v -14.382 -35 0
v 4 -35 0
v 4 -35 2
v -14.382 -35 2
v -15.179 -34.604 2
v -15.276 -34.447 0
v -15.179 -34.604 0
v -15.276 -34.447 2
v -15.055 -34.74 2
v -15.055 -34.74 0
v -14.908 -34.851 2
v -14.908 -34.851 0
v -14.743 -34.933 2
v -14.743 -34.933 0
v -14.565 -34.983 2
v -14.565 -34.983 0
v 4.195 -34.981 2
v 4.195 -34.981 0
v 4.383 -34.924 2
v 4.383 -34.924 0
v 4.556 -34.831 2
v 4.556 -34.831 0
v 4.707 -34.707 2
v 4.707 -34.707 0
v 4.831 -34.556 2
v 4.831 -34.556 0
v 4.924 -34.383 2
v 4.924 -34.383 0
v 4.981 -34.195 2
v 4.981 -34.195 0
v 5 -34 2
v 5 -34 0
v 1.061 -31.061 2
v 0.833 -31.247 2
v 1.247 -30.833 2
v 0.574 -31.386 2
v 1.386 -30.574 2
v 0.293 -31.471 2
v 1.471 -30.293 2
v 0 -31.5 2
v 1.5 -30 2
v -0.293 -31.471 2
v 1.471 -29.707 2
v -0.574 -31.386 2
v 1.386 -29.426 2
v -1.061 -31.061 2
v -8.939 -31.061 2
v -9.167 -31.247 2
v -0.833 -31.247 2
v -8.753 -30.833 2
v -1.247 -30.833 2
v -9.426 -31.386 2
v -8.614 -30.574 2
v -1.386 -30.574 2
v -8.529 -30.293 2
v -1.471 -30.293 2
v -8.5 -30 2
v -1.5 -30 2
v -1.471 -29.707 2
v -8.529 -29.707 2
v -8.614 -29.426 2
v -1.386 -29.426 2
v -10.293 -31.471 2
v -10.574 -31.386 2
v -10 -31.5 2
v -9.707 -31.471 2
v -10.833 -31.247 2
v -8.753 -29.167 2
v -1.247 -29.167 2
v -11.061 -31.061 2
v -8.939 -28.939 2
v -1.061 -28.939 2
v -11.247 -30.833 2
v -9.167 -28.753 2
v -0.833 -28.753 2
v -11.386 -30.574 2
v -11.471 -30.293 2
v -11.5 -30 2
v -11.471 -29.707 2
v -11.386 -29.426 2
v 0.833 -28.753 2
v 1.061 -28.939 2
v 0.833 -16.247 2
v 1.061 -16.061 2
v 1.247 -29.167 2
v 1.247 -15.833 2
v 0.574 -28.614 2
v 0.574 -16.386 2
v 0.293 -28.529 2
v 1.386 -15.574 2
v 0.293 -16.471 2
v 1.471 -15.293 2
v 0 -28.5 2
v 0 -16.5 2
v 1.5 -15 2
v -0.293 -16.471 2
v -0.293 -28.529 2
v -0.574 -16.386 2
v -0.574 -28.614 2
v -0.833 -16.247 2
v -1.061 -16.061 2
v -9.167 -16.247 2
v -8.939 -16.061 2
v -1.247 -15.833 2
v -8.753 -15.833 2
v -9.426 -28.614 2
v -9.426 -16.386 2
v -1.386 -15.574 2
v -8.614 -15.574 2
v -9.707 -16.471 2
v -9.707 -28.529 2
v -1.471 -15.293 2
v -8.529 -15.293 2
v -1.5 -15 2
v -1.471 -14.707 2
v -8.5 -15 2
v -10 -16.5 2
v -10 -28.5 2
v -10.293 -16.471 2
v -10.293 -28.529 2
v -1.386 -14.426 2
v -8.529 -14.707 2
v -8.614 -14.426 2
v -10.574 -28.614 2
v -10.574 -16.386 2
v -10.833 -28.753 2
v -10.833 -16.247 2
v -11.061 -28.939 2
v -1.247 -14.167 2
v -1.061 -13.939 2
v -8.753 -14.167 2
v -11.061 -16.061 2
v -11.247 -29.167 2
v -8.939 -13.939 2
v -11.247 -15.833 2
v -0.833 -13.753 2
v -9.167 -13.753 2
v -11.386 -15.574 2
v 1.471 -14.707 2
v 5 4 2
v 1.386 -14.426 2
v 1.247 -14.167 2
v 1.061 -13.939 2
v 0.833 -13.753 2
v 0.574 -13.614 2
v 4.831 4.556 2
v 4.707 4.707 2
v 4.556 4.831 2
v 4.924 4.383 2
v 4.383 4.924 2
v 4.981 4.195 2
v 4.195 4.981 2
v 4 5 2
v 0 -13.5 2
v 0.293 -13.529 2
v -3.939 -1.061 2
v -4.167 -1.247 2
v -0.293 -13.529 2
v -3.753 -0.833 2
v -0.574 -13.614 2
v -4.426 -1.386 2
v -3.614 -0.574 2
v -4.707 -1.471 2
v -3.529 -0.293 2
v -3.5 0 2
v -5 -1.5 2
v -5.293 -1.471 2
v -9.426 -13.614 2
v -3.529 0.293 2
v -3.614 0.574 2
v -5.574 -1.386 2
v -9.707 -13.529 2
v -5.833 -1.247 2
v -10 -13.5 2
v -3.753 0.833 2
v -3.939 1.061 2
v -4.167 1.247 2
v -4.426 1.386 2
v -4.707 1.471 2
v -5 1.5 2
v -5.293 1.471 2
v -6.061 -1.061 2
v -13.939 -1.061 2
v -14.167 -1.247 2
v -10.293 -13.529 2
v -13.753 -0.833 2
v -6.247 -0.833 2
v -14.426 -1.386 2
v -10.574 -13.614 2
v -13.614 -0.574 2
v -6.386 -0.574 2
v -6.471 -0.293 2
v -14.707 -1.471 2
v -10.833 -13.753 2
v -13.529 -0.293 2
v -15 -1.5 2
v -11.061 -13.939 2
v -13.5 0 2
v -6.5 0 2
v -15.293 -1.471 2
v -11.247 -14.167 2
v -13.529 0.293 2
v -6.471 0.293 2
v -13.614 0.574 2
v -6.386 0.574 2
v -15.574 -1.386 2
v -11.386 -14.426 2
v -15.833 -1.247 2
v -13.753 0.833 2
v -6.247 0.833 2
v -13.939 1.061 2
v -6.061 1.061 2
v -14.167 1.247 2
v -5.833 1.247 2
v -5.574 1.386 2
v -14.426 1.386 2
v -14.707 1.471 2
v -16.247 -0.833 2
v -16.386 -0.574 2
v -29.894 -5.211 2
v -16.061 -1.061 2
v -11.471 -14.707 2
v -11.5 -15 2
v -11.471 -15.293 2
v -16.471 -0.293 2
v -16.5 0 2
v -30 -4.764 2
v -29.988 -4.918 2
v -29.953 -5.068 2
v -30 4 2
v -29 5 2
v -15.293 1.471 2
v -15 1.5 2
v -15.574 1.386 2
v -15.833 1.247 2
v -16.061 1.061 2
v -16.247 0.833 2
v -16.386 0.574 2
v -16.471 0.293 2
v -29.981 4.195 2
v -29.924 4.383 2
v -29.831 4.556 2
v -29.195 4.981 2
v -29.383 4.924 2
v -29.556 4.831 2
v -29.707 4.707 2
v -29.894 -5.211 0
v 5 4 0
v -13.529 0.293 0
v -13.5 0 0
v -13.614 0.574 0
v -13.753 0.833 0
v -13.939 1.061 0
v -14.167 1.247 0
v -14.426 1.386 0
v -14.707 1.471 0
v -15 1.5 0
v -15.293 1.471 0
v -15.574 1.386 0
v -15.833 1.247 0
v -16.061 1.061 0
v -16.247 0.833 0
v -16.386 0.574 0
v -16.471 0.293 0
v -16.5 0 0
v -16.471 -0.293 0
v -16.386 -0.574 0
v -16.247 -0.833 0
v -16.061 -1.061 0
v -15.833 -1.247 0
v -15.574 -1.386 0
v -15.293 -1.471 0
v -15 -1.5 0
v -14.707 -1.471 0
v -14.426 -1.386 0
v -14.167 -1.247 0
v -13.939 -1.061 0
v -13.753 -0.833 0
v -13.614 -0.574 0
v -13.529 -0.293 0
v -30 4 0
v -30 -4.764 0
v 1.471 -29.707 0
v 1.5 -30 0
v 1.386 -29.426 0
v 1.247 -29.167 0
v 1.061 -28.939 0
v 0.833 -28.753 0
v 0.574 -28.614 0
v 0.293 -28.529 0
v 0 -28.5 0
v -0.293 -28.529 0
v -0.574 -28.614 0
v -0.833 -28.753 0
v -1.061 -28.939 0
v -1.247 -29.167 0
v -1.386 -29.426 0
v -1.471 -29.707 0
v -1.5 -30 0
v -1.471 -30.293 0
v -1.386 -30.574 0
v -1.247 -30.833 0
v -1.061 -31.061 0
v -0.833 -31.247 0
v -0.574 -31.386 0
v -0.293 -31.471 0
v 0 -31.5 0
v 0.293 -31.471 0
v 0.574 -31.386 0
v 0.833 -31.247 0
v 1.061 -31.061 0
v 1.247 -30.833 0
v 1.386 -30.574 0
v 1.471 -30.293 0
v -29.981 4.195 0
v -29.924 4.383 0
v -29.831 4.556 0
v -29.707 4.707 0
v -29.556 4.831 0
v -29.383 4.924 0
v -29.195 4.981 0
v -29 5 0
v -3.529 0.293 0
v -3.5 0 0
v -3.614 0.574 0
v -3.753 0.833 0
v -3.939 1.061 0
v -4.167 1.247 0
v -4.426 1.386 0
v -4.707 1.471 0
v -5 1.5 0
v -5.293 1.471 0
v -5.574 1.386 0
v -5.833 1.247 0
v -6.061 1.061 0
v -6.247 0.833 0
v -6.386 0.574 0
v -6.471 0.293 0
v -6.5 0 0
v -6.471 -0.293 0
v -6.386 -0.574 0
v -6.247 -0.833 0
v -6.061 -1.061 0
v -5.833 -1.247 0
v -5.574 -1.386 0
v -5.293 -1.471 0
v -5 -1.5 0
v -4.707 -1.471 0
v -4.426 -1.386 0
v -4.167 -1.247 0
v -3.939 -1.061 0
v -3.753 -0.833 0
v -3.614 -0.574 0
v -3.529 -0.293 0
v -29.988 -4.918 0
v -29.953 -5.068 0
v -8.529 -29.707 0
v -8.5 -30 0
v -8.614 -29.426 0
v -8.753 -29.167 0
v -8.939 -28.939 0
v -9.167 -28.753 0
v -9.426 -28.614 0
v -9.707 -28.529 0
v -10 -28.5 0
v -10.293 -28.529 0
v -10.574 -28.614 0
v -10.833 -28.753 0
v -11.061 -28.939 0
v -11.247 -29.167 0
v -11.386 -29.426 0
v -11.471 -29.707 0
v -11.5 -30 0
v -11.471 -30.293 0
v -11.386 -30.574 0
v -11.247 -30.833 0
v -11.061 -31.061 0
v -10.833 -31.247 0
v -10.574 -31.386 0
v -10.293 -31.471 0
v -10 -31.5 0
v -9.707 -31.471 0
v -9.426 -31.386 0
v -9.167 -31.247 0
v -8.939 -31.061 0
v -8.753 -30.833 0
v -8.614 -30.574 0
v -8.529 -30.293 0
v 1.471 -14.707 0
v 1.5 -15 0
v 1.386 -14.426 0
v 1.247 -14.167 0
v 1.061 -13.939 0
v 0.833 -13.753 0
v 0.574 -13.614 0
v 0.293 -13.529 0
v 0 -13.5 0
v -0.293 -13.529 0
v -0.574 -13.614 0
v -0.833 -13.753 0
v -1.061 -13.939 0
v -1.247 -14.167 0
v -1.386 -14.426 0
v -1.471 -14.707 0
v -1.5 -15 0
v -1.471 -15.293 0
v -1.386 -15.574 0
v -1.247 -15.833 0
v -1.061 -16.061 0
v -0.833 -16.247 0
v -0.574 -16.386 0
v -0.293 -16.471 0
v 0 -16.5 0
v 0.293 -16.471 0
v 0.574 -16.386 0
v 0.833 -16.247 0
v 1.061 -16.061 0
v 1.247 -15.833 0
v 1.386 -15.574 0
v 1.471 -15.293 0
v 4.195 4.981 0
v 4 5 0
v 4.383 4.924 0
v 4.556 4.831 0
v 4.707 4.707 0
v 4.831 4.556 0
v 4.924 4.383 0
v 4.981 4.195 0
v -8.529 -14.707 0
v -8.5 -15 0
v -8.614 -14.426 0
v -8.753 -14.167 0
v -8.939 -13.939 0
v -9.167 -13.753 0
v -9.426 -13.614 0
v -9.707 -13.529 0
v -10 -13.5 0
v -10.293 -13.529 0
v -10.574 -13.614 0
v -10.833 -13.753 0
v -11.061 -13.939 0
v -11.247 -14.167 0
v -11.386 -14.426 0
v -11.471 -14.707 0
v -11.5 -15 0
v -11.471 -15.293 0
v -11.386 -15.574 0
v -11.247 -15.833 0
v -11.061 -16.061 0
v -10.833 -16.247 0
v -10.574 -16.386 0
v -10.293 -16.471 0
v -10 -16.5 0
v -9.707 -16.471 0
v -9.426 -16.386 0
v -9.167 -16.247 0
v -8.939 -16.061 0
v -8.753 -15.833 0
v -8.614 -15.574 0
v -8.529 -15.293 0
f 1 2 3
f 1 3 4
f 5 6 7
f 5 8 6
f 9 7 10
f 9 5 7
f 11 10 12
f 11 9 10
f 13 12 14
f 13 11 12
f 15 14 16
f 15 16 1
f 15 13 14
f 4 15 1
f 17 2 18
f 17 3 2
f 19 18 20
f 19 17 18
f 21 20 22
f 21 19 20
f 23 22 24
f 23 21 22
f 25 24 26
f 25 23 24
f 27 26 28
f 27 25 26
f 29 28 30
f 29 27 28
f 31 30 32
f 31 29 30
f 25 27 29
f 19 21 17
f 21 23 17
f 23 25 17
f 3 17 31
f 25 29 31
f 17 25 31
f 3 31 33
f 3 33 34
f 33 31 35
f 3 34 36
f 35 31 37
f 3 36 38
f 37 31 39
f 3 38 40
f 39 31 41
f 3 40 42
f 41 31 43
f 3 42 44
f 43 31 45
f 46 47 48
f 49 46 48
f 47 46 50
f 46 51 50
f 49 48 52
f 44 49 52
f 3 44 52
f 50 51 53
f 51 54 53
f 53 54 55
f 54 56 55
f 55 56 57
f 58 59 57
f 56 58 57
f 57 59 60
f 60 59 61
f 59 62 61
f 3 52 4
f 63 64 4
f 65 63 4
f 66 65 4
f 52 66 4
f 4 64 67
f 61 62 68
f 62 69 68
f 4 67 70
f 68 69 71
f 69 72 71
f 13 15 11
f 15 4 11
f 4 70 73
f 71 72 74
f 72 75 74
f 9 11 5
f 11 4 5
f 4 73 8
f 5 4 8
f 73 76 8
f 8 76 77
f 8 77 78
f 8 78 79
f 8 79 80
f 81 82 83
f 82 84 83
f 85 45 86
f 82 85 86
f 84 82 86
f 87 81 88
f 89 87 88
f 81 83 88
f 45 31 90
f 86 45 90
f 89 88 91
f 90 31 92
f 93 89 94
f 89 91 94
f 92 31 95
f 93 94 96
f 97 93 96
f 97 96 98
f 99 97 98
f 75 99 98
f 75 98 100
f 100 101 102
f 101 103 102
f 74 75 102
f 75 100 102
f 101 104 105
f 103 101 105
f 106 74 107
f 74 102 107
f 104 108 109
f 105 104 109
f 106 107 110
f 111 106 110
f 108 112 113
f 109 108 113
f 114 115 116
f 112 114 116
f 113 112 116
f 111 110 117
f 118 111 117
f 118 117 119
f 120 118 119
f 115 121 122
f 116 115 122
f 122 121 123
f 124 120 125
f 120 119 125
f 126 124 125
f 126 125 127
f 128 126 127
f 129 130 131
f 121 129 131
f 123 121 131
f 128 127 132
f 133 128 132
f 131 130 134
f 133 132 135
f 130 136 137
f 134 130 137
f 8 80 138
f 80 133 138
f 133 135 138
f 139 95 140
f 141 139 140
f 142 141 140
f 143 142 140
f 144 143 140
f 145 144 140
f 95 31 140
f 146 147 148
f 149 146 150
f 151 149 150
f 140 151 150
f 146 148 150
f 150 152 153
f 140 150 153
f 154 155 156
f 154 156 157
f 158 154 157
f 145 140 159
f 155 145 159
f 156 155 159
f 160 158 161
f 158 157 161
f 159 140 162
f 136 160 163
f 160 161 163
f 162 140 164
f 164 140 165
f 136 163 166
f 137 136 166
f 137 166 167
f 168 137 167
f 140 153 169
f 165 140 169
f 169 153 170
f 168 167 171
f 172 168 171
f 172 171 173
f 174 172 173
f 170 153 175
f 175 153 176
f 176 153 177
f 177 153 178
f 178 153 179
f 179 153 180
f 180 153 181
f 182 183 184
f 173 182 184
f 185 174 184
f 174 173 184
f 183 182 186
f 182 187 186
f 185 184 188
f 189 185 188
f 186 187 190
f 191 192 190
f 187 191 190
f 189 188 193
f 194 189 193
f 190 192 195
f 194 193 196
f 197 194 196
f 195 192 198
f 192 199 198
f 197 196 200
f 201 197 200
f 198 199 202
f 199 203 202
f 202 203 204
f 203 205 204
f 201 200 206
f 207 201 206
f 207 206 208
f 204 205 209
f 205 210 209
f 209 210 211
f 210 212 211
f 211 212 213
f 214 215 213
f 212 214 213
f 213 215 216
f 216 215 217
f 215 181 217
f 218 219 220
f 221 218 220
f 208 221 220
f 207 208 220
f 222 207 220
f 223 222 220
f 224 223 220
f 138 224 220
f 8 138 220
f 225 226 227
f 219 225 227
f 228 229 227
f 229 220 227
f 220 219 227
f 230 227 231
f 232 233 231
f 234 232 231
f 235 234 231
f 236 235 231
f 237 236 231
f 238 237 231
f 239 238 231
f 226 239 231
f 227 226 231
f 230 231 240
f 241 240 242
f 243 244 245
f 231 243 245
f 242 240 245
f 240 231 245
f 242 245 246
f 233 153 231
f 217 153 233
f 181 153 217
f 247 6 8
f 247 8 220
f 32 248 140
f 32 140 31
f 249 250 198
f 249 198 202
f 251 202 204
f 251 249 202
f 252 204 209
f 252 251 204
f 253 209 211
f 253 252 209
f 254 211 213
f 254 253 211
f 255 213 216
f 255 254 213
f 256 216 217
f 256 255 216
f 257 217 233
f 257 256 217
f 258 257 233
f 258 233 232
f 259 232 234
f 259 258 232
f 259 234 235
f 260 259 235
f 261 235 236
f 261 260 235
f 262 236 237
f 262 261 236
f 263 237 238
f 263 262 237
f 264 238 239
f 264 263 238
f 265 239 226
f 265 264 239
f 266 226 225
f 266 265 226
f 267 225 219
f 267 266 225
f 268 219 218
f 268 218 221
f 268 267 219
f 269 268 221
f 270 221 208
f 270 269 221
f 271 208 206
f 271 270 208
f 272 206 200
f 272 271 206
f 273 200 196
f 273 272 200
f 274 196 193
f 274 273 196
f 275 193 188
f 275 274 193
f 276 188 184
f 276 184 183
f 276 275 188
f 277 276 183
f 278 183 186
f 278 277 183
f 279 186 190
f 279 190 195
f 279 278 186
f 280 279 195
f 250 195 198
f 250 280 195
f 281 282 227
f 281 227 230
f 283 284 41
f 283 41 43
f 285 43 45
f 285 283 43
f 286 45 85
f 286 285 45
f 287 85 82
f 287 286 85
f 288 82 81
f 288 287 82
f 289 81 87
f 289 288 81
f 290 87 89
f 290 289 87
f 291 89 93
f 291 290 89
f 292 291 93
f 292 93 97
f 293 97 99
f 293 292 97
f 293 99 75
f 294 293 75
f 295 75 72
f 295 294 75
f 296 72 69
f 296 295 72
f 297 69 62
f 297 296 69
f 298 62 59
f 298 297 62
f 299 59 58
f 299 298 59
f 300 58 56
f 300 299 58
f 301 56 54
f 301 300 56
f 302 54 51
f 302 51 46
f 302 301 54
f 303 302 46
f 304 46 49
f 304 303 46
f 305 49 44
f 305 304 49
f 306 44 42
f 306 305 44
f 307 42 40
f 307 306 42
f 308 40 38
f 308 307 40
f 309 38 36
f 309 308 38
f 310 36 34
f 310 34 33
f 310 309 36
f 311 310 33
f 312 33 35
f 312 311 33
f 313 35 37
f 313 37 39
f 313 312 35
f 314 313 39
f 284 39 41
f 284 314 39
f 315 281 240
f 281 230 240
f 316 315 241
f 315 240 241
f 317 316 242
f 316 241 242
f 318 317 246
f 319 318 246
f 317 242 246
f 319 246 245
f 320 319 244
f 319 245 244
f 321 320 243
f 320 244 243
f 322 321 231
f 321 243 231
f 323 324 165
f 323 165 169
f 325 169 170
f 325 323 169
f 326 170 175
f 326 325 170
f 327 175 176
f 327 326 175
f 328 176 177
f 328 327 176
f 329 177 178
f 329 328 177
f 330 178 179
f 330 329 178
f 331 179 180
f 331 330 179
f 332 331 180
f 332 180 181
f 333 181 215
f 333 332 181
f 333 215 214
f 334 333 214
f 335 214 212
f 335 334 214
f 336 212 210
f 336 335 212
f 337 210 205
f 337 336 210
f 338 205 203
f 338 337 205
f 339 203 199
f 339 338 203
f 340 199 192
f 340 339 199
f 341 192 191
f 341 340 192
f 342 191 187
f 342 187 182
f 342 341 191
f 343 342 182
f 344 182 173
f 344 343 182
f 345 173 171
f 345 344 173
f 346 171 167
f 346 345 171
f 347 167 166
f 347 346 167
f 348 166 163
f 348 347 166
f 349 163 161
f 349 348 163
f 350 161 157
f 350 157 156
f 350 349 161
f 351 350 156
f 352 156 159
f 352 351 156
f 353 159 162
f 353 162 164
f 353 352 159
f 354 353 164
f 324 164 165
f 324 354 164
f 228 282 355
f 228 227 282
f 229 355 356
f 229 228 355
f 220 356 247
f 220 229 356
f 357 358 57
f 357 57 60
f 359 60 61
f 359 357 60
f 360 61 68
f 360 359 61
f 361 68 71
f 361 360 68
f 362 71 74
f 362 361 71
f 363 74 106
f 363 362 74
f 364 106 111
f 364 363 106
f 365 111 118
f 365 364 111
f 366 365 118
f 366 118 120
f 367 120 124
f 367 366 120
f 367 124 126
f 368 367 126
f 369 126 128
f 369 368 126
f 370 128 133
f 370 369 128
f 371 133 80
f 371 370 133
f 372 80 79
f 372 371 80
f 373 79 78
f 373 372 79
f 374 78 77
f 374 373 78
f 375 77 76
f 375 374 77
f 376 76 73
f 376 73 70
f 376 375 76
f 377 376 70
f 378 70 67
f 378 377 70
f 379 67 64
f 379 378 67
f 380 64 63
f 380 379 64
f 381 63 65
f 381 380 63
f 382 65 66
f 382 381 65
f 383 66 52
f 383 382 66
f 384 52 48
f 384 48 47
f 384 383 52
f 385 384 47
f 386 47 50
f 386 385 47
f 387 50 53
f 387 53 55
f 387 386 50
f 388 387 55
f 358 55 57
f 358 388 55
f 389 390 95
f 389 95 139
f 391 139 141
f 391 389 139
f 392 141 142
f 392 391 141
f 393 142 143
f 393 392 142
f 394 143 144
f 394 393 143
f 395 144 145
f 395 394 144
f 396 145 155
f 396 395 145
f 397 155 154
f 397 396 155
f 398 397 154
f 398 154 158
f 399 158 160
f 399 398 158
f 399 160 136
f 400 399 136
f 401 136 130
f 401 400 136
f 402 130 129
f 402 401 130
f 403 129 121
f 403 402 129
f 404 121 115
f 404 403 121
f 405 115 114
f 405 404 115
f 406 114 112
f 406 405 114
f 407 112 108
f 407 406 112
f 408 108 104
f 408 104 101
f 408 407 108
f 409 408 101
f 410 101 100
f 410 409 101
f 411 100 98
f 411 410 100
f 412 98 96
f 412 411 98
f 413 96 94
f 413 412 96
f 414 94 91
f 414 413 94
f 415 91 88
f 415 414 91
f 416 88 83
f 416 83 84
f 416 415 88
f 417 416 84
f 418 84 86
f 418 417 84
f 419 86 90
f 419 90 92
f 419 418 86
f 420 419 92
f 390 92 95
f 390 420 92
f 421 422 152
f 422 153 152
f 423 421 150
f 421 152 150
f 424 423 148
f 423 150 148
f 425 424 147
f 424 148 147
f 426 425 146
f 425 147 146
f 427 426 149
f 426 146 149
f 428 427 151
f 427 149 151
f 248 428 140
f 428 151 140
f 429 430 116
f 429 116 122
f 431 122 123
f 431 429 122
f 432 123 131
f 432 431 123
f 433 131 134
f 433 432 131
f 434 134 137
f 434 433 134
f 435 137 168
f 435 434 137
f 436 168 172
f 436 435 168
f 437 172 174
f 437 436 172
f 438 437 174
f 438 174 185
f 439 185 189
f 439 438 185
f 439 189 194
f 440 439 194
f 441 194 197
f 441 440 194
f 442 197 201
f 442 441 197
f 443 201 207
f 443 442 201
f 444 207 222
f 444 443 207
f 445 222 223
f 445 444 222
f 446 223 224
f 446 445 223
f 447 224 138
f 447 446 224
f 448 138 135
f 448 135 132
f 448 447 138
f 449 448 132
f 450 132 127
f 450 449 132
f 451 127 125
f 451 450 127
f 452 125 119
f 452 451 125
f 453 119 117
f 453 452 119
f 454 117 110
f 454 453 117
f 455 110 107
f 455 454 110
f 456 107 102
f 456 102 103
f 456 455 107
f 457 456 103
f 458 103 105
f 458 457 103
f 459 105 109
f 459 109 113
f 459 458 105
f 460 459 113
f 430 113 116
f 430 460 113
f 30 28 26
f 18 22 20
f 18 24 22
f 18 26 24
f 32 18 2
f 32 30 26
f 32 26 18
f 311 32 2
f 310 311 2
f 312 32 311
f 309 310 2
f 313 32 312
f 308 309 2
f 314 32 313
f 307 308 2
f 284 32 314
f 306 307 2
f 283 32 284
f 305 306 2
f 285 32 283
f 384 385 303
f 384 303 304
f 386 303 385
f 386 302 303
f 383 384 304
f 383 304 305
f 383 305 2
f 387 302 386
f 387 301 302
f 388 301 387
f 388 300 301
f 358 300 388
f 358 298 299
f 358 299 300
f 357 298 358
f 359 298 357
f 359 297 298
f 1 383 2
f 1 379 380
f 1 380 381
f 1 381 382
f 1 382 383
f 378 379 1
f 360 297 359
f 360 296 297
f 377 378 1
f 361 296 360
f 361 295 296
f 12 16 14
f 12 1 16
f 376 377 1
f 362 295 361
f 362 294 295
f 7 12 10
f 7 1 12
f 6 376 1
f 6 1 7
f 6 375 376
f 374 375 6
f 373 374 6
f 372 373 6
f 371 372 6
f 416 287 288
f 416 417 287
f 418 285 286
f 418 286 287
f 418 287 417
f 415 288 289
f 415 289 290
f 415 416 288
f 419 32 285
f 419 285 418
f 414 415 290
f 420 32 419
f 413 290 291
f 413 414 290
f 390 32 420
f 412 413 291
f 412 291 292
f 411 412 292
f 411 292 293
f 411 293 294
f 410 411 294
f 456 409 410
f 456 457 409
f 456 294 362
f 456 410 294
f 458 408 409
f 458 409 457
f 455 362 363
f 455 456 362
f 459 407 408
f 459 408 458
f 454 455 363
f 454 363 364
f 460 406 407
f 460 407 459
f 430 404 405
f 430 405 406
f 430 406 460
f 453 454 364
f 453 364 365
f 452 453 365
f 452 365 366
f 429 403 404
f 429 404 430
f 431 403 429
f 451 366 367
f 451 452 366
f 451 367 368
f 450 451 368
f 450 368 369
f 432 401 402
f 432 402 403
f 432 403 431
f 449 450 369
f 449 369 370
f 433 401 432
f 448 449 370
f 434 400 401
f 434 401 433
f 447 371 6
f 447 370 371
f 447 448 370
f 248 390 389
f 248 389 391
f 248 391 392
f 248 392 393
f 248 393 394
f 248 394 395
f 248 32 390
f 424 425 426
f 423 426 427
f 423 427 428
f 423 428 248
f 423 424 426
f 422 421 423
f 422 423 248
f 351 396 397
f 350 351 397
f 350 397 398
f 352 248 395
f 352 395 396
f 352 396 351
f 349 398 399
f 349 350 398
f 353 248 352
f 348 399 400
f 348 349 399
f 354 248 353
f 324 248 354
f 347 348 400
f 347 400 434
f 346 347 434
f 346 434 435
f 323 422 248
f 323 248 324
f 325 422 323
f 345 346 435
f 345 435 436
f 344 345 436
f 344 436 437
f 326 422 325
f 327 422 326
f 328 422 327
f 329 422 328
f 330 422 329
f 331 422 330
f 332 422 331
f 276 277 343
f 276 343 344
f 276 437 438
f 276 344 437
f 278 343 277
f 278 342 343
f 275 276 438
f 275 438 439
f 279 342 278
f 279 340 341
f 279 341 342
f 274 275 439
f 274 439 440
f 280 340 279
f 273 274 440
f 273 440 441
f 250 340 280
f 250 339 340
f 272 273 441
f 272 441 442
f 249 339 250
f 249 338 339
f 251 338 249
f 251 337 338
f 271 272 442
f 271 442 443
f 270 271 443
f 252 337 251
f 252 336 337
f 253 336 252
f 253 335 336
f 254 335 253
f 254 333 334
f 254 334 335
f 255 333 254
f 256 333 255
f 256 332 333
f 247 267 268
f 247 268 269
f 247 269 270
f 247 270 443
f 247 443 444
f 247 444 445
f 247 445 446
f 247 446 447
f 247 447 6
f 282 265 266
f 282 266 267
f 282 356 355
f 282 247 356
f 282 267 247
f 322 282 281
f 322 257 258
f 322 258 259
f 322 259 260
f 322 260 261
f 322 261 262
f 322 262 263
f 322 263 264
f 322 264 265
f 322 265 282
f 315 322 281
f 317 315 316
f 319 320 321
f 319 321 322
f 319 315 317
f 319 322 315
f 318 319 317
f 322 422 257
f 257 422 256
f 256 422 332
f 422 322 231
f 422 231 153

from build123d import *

# Parameters (mm, degrees)
SKETCH_1_R      = 1.5
EXTRUDE_1_DEPTH = 2
FILLET_1_R      = 1


with BuildPart() as part:
    # 草图1 → 凸台-拉伸1 (new body)
    with BuildSketch(Plane.XY):
        Polygon((-30, -5), (-30, 5), (5, 5), (5, -35), (-15, -35), align=None)
        with Locations((-15, 0)):
            Circle(SKETCH_1_R, mode=Mode.SUBTRACT)
        with Locations((-5, 0)):
            Circle(SKETCH_1_R, mode=Mode.SUBTRACT)
        with Locations((-10, -15)):
            Circle(SKETCH_1_R, mode=Mode.SUBTRACT)
        with Locations((-10, -30)):
            Circle(SKETCH_1_R, mode=Mode.SUBTRACT)
        with Locations((0, -30)):
            Circle(SKETCH_1_R, mode=Mode.SUBTRACT)
        with Locations((0, -15)):
            Circle(SKETCH_1_R, mode=Mode.SUBTRACT)
    extrude(amount=EXTRUDE_1_DEPTH)

    # 圆角1
    fillet_1_edges = [part.edges().sort_by_distance(p)[0] for p in [
        (-30, -5, 1),
        (-30, 5, 1),
        (5, 5, 1),
        (5, -35, 1),
        (-15, -35, 1),
    ]]
    fillet(fillet_1_edges, radius=FILLET_1_R)


solid = part.part
